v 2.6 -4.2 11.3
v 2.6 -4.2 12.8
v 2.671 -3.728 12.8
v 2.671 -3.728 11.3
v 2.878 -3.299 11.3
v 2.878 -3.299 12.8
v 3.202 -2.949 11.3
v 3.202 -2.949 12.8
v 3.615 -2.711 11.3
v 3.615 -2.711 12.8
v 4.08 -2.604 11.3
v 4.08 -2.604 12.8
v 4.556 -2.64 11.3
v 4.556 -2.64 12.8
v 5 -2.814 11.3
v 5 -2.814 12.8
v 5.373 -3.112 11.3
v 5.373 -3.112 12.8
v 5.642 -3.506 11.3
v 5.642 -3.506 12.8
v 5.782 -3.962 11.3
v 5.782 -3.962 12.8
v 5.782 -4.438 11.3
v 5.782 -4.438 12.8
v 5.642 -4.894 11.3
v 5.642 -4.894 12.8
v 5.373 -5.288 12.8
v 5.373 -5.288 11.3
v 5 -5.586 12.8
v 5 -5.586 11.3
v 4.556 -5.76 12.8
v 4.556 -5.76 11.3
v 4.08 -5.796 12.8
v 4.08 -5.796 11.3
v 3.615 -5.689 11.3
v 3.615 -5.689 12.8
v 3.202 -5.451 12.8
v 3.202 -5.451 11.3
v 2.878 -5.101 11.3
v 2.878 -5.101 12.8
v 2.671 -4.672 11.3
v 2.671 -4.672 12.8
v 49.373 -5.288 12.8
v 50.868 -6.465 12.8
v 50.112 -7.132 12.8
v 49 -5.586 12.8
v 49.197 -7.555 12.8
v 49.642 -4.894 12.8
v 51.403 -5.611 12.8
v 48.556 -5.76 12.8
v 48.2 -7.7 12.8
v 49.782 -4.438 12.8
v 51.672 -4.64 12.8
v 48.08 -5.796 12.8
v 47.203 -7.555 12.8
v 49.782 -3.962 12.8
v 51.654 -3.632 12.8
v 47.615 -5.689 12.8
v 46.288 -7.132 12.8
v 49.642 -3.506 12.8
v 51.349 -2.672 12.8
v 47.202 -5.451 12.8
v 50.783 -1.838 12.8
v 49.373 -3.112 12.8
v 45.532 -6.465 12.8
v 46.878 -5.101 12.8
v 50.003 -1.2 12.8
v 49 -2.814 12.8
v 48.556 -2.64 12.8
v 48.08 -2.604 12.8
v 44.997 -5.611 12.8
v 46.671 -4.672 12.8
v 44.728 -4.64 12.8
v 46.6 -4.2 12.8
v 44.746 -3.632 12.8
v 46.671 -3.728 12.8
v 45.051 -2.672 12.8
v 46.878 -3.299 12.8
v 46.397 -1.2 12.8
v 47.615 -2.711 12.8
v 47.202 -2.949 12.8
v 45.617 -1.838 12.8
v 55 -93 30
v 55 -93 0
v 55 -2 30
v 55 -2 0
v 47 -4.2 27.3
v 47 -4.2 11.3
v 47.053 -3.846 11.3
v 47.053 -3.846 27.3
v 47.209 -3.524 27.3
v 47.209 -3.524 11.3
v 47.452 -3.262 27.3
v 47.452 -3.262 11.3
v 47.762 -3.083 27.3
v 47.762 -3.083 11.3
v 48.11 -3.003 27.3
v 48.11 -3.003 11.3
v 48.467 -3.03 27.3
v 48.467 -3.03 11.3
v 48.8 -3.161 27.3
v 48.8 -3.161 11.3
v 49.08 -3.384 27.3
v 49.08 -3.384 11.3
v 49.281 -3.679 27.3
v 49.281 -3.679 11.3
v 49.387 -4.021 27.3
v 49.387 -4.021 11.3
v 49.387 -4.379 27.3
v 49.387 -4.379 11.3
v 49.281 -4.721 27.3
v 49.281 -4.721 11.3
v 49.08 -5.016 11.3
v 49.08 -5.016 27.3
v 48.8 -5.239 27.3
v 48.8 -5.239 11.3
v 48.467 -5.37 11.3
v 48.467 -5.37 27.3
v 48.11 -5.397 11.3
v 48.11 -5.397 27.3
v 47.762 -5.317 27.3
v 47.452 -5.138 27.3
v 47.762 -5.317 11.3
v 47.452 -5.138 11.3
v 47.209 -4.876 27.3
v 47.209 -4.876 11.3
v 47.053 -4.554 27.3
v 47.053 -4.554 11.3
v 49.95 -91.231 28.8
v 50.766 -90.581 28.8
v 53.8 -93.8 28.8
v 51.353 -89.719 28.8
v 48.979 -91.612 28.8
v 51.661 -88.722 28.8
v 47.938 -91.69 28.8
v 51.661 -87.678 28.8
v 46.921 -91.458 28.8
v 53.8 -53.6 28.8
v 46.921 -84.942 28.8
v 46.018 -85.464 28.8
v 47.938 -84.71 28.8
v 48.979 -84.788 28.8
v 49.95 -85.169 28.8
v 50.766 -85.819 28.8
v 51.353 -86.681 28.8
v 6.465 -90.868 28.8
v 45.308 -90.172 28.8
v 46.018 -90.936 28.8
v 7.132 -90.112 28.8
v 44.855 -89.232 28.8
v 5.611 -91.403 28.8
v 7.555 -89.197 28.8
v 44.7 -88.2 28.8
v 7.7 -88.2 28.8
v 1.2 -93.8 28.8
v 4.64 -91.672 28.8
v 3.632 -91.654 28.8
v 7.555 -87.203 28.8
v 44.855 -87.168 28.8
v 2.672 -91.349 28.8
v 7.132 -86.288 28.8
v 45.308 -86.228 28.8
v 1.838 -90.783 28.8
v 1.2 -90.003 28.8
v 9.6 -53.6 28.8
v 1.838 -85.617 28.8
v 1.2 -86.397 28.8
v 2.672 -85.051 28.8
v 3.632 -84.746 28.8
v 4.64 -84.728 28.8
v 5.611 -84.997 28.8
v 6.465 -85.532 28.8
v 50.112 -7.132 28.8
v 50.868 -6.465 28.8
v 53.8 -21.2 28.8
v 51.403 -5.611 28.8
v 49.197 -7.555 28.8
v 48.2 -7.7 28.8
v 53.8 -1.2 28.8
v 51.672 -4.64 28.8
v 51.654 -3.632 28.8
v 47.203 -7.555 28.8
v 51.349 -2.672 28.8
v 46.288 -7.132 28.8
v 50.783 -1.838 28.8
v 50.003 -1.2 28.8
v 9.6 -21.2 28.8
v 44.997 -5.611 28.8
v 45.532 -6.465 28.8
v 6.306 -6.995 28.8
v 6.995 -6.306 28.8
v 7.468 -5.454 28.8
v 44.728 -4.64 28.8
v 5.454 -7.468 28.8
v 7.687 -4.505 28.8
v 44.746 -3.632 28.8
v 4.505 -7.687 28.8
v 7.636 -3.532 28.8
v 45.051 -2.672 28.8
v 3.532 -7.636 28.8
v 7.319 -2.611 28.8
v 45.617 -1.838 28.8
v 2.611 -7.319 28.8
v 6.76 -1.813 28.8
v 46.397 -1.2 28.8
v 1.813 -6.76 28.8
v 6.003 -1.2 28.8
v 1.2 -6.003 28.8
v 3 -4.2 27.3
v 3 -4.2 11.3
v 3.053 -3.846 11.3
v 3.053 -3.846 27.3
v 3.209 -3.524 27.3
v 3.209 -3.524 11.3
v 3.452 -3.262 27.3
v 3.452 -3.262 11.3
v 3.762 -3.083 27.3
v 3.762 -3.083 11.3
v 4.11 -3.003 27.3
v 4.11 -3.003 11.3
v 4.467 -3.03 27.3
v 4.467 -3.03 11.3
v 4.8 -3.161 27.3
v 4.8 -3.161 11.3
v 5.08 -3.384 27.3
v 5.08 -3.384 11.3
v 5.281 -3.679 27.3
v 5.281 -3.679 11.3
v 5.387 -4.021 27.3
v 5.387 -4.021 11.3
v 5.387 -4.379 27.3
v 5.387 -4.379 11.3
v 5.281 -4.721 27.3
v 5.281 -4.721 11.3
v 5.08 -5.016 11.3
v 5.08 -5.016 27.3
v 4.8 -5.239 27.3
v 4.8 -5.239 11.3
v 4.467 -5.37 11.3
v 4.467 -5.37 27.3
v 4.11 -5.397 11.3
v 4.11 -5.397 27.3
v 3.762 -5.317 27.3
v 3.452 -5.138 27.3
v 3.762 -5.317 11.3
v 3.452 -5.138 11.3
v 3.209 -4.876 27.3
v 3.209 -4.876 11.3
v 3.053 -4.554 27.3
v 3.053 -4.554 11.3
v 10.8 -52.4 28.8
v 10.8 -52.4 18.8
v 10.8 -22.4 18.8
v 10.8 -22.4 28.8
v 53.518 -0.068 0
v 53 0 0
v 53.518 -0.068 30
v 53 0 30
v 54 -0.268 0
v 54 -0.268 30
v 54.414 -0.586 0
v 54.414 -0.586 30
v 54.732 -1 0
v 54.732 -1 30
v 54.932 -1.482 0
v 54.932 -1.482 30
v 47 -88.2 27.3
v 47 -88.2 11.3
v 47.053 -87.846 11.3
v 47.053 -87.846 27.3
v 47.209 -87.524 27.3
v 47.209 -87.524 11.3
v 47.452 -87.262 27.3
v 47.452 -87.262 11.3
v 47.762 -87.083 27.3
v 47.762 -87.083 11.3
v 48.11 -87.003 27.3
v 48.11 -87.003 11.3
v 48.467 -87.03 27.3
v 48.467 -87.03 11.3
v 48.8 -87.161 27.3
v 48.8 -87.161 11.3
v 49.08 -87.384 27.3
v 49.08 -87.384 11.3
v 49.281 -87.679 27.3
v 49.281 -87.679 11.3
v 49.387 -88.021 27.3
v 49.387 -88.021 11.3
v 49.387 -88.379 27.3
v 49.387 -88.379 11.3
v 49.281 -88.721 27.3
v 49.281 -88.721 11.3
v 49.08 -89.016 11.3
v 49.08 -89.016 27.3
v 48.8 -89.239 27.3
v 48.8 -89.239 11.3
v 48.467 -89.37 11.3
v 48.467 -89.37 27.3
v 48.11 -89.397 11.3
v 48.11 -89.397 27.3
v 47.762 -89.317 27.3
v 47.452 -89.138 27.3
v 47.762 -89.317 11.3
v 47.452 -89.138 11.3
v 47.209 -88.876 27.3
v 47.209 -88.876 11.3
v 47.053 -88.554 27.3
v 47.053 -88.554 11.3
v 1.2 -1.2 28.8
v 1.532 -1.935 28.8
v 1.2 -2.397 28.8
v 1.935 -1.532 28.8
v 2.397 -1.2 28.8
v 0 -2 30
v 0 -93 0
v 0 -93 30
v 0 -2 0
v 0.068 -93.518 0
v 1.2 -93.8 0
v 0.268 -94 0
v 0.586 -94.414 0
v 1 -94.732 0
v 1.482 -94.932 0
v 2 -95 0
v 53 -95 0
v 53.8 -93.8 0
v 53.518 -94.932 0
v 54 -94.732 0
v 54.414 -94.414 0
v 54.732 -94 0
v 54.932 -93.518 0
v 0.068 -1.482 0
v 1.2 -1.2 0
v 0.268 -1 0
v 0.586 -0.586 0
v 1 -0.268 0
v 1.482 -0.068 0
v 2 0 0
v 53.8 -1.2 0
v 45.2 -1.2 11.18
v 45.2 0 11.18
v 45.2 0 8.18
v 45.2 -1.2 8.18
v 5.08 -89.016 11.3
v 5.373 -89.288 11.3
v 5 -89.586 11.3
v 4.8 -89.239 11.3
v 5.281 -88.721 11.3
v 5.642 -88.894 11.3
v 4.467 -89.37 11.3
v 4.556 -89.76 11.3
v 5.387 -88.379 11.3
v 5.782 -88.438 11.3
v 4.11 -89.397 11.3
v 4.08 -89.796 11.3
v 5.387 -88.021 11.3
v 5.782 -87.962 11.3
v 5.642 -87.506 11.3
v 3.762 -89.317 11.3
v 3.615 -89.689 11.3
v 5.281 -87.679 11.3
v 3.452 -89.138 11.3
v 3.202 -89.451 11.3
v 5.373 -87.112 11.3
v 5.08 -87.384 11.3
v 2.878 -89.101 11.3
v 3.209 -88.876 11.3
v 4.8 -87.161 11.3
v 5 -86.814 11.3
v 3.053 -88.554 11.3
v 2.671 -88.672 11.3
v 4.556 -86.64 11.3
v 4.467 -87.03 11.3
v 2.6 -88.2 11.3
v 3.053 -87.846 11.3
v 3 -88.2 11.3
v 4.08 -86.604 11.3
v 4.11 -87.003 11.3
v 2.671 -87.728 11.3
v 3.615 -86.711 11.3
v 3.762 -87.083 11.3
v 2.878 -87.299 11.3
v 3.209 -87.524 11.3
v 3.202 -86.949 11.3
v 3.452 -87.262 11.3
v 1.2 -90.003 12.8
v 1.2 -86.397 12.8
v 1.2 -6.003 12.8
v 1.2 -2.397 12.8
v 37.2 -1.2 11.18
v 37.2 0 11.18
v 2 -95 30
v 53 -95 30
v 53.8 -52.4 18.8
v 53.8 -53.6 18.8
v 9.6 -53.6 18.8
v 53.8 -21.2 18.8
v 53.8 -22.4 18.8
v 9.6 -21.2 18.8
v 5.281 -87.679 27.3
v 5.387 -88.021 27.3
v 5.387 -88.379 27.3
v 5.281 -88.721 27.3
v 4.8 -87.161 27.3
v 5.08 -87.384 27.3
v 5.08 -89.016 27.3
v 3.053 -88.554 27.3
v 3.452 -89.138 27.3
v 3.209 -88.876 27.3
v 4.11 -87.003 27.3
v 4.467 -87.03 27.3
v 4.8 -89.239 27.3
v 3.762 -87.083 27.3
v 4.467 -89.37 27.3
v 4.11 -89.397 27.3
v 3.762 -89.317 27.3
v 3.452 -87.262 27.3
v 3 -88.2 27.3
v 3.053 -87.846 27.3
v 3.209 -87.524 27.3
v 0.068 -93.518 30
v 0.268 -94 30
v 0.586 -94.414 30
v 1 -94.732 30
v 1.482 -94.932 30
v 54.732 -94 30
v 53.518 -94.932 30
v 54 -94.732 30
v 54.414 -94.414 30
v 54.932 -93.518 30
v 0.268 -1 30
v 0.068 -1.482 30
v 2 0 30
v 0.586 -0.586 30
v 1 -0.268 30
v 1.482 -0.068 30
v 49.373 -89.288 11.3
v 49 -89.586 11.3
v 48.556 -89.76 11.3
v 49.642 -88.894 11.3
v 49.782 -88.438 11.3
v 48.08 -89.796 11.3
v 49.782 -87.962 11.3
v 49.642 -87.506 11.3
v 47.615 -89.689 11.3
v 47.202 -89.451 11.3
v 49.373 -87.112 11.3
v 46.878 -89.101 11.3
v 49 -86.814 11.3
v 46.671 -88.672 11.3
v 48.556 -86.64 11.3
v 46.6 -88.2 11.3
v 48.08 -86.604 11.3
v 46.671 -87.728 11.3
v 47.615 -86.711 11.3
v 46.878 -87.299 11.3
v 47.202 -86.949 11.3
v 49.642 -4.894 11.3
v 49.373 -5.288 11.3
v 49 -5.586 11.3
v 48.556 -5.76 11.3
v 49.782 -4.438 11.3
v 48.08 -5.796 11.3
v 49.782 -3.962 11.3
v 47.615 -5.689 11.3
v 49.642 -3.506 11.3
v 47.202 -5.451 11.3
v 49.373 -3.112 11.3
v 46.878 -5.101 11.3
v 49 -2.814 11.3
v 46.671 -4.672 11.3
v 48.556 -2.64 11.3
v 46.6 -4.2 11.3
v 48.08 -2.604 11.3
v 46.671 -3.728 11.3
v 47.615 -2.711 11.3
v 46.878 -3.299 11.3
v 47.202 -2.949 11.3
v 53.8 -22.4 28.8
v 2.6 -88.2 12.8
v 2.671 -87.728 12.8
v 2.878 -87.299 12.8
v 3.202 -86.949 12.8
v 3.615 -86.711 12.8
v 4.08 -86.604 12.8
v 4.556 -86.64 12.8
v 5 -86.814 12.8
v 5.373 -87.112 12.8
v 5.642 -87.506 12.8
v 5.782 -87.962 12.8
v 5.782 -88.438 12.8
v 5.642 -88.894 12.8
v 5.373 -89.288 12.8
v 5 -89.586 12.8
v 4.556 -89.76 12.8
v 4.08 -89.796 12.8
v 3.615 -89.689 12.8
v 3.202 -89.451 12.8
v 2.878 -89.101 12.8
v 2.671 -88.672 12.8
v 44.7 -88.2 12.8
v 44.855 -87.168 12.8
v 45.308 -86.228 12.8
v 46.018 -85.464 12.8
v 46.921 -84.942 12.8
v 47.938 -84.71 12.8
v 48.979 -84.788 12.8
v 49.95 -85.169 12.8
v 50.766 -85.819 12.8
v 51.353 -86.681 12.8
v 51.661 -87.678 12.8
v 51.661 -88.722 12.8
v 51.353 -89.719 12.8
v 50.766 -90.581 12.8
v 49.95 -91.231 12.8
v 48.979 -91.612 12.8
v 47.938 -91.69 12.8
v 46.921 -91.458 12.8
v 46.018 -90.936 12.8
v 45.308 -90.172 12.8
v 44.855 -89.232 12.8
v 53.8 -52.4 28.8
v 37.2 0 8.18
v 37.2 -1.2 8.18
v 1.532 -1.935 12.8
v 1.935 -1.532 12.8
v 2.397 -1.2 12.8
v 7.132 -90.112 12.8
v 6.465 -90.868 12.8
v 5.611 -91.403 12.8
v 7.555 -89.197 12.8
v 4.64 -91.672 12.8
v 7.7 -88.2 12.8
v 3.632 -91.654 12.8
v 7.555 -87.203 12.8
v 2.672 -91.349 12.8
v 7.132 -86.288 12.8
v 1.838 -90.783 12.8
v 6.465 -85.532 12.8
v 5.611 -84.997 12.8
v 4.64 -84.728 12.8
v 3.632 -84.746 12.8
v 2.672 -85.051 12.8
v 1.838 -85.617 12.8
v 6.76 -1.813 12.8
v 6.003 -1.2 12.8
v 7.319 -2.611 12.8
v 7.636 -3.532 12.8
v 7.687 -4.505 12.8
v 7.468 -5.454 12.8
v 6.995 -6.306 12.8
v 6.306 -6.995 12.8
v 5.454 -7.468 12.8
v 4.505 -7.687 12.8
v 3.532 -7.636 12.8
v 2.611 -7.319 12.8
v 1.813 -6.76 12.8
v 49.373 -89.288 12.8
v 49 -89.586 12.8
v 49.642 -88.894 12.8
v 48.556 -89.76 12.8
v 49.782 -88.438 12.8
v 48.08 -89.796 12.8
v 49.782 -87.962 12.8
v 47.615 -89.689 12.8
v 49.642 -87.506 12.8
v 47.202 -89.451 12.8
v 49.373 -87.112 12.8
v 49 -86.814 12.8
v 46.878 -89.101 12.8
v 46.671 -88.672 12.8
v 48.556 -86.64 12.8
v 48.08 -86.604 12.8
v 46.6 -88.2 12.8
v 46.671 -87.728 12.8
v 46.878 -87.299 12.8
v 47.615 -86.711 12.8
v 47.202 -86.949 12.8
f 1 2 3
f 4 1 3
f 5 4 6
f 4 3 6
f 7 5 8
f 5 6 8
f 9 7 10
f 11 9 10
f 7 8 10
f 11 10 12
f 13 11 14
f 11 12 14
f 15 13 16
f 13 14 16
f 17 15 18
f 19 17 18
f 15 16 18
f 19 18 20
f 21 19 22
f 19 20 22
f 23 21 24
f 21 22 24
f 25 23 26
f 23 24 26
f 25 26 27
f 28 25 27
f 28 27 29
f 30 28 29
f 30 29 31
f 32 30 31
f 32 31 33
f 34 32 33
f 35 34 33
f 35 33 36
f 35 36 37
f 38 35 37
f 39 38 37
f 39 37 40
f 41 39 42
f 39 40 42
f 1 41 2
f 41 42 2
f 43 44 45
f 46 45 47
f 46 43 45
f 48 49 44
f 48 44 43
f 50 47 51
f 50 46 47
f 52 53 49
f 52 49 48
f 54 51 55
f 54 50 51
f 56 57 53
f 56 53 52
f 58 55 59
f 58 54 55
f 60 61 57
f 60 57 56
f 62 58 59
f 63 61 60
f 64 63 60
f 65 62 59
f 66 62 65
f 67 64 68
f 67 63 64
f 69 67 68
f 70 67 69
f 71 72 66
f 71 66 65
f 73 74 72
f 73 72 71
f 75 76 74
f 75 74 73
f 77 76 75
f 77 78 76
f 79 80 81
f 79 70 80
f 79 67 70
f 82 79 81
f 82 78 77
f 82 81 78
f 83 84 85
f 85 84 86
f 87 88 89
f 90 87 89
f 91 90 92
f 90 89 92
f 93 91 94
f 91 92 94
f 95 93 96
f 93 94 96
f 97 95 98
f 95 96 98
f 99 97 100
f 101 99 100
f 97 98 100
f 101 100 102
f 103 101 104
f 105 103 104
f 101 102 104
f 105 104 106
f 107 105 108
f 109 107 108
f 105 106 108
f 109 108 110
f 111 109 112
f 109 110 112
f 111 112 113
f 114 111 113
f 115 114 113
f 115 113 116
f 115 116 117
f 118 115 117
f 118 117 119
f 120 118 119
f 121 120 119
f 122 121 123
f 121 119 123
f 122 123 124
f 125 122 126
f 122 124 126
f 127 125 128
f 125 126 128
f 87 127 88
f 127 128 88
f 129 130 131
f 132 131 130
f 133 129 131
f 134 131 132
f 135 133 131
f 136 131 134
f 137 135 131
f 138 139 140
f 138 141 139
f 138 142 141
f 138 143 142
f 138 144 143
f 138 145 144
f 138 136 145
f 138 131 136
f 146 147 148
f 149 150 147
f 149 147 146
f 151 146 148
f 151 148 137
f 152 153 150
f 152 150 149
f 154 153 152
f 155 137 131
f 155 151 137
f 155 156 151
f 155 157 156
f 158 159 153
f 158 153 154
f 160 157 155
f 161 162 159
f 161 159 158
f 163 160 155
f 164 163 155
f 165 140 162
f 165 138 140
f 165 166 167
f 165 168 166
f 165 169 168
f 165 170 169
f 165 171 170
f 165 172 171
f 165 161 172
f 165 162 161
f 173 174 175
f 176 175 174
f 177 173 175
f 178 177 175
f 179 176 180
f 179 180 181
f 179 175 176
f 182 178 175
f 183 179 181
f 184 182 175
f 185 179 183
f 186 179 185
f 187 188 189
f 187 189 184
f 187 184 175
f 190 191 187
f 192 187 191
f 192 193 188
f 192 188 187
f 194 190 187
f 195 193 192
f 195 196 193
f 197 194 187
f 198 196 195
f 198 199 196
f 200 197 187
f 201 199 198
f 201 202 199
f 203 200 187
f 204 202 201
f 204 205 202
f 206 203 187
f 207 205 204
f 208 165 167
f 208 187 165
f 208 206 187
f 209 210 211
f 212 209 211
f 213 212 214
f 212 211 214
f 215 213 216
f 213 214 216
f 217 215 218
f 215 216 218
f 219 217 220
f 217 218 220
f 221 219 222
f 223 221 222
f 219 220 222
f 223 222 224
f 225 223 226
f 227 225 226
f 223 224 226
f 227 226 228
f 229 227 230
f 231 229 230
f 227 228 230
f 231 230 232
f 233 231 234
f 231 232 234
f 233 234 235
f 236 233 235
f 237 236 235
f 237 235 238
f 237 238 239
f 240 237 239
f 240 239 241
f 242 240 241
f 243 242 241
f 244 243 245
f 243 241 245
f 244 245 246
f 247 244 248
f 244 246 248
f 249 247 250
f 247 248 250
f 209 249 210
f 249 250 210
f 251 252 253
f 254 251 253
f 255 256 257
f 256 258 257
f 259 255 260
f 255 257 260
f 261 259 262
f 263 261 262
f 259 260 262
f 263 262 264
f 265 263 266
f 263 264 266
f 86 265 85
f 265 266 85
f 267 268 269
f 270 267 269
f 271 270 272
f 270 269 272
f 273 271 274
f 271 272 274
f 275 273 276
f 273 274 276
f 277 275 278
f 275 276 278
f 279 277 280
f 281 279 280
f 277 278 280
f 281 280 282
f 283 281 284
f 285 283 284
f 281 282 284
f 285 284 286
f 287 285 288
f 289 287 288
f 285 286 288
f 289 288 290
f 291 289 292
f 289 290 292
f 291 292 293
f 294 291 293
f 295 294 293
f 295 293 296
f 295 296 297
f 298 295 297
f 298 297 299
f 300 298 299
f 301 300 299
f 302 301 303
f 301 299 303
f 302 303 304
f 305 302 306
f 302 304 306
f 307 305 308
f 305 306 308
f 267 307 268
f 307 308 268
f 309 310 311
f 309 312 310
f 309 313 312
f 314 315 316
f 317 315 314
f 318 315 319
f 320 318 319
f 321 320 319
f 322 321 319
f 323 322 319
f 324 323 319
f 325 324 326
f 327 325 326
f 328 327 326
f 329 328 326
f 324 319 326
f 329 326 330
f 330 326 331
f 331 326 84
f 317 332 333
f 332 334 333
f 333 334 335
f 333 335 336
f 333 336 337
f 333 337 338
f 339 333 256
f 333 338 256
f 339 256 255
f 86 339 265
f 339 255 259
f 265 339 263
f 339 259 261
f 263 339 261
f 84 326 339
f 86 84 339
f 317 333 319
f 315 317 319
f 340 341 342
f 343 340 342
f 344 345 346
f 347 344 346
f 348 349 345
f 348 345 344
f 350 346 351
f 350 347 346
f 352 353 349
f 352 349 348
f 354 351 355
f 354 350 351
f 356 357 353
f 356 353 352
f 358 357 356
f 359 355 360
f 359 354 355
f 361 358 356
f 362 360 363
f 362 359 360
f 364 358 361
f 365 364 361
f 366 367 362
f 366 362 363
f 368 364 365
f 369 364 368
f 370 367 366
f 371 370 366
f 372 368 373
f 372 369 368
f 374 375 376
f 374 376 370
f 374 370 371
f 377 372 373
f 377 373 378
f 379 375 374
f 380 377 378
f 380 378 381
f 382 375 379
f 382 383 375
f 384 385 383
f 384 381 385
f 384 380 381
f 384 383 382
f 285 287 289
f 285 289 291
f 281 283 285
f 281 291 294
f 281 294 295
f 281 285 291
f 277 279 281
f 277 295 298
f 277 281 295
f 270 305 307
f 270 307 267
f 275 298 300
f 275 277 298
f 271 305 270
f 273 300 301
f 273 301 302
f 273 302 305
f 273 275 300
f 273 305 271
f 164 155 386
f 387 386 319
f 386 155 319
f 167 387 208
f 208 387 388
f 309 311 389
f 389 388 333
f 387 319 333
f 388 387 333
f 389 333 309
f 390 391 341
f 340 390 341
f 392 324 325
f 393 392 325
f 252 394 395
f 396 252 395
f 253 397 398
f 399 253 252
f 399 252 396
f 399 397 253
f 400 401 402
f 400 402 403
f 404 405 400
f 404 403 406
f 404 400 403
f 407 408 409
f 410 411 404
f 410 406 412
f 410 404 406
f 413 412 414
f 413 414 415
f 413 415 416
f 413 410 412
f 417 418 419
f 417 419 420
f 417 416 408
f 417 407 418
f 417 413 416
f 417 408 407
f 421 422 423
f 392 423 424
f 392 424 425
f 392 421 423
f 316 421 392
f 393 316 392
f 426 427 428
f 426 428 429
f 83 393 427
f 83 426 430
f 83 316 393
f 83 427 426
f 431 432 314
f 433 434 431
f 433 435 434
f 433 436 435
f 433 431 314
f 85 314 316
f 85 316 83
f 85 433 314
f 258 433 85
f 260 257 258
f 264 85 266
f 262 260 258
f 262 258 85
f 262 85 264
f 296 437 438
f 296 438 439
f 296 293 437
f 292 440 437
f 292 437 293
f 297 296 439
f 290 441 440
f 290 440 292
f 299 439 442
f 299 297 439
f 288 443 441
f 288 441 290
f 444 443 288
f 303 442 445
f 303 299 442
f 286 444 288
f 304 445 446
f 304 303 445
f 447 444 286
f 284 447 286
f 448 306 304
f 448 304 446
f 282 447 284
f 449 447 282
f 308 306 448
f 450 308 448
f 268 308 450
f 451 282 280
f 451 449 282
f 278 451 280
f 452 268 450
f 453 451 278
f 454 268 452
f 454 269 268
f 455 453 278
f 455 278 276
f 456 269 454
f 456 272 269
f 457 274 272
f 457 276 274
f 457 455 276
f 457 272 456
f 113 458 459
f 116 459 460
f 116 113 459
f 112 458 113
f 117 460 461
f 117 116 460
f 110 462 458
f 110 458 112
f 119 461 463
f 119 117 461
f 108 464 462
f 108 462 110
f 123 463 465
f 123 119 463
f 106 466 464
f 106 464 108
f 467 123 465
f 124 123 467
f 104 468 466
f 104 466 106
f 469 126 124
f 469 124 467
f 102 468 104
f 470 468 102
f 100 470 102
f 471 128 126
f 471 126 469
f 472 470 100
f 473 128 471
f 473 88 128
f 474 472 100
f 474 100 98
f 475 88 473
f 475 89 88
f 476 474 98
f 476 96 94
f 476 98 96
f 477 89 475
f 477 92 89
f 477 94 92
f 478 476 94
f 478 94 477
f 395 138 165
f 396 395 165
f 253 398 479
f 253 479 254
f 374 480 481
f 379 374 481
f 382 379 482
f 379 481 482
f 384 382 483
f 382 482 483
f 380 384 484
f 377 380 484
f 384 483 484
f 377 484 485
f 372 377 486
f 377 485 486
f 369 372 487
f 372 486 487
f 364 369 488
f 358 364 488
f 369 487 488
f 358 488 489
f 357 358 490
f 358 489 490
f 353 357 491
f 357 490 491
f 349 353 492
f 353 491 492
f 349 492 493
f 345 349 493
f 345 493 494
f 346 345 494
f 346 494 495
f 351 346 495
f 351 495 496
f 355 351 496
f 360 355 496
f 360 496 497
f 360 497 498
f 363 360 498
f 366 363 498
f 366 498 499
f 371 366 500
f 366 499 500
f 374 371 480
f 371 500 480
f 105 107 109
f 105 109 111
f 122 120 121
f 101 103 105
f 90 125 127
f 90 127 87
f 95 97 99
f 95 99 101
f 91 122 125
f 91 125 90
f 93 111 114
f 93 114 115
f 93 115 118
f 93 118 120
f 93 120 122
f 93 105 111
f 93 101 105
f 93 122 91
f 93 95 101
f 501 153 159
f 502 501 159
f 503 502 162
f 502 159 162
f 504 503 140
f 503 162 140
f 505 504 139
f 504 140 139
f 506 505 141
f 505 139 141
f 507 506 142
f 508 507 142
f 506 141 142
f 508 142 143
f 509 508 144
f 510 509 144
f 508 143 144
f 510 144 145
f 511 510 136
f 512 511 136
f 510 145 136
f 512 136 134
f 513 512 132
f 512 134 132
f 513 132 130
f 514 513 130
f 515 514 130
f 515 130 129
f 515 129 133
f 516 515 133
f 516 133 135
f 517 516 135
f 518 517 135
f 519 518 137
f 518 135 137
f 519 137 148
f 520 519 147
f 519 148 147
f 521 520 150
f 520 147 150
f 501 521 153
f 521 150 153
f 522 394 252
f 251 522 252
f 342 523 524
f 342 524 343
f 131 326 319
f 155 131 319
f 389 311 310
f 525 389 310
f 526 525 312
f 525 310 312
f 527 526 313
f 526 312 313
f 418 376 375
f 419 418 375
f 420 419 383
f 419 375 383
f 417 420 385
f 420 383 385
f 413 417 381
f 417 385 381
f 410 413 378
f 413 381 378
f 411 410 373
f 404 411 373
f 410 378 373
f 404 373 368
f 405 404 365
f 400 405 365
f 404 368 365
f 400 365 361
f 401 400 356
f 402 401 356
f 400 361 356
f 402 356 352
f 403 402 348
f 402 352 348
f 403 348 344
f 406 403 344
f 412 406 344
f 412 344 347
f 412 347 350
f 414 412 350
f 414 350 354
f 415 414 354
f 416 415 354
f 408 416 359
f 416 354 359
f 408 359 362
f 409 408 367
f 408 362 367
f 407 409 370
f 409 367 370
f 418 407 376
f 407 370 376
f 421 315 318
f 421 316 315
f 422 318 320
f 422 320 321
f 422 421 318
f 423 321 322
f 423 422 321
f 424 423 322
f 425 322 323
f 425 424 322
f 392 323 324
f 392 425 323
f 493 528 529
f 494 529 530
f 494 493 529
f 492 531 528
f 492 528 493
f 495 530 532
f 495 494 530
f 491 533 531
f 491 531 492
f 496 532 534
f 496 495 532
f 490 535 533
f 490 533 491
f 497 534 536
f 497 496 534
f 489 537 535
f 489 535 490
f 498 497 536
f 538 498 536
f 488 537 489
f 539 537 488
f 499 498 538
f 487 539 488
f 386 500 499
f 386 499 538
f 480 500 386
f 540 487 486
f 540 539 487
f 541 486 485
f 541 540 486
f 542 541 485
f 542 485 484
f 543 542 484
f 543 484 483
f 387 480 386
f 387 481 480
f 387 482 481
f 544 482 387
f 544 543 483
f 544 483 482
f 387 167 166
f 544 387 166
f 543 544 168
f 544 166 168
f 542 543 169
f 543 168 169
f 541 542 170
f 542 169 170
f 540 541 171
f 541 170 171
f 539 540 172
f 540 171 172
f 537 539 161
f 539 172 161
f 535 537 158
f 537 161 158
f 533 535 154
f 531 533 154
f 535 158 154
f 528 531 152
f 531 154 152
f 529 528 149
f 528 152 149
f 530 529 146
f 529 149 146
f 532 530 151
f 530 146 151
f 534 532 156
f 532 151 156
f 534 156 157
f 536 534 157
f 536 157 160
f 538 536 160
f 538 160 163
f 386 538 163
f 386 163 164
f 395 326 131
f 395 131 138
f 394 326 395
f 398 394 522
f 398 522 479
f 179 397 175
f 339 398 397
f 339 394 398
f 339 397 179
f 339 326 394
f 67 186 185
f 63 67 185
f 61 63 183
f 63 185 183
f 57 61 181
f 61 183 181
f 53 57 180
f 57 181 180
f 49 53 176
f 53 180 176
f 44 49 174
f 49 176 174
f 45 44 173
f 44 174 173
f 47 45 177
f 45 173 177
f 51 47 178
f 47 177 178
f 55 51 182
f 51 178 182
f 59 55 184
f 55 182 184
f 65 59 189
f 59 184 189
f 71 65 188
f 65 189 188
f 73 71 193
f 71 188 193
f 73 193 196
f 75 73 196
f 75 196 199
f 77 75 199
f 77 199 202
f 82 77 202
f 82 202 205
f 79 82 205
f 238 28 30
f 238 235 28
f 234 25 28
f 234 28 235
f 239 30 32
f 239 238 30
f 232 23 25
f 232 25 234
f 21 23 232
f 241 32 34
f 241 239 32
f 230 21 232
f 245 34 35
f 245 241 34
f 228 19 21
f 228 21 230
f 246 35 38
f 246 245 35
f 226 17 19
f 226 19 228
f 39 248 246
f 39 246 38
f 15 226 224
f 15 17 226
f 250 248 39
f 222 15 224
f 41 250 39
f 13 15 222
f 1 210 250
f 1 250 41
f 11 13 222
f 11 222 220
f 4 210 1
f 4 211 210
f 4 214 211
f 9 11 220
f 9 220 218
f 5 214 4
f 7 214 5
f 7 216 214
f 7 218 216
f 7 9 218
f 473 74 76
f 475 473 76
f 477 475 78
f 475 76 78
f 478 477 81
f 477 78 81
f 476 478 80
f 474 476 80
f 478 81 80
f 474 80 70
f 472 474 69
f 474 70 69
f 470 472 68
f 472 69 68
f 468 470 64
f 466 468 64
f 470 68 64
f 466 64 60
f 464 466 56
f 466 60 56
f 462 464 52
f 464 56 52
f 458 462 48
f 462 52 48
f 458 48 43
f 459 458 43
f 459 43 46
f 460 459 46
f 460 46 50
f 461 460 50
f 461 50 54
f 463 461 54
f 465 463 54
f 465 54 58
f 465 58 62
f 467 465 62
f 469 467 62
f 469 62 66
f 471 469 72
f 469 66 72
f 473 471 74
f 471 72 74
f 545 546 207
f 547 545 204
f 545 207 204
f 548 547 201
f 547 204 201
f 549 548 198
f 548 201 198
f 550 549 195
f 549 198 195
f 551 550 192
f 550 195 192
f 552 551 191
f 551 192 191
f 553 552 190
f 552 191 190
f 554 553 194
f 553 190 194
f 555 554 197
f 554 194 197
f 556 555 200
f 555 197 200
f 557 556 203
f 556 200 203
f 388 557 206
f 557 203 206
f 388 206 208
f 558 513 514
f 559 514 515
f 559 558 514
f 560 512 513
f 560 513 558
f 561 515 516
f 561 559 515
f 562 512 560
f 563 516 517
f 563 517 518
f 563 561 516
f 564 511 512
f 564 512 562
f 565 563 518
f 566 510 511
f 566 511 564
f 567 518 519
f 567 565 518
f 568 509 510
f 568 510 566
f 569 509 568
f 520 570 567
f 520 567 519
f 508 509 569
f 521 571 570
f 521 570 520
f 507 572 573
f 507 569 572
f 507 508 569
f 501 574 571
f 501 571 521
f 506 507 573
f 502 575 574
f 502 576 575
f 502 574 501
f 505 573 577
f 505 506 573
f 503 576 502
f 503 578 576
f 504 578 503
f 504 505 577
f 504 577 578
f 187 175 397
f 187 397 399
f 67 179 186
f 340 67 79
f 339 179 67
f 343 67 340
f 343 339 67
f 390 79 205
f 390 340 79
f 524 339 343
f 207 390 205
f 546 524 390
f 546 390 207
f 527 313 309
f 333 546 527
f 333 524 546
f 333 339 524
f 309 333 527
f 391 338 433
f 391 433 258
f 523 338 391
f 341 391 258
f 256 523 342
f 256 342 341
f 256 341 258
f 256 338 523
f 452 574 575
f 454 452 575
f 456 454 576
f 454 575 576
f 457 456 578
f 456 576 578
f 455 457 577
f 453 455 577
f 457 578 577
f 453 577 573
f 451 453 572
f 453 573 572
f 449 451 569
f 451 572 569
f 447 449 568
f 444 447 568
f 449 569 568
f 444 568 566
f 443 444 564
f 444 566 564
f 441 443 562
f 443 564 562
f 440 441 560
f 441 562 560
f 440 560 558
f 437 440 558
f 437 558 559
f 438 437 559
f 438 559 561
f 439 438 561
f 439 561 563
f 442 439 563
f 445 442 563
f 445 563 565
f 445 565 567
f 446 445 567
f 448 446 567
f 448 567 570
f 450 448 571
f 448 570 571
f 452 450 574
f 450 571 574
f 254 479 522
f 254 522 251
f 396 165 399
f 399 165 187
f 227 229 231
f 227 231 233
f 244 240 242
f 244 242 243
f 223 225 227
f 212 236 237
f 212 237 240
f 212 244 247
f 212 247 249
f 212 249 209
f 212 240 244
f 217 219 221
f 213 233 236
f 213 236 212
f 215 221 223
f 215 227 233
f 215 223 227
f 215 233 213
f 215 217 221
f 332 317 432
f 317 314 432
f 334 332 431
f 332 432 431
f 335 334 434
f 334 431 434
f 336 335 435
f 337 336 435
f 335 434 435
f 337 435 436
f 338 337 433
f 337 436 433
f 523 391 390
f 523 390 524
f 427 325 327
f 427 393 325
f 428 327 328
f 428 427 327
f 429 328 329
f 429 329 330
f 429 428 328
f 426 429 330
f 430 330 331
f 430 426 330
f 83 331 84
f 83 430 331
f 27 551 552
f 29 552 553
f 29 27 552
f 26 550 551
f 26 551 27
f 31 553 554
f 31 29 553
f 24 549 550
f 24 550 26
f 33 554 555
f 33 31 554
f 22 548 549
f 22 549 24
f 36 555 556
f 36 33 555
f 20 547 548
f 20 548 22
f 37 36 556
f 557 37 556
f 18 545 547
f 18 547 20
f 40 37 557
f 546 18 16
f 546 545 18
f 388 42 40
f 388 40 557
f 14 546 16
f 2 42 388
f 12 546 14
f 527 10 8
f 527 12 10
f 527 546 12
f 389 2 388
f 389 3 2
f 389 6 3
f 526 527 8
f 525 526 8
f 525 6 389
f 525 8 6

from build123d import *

# Parameters (mm, degrees)
SKETCH1_W           = 55
SKETCH1_H           = 95
BOSS_EXTRUDE1_DEPTH = 30
SKETCH2_W           = 52.6
SKETCH2_H           = 92.6
CUT_EXTRUDE1_DEPTH  = 28.8
SKETCH3_R           = 3.5
BOSS_EXTRUDE2_DEPTH = 16
SKETCH6_R           = 1.6
BOSS_EXTRUDE3_DEPTH = 1.5
FILLET3_R           = 2
SKETCH8_W           = 44.2
SKETCH8_H           = 32.4
BOSS_EXTRUDE4_DEPTH = 10
SKETCH9_W           = 43
SKETCH9_H           = 30
CUT_EXTRUDE3_DEPTH  = 10
CUT_EXTRUDE4_REACH  = 97
SKETCH11_W          = 8
SKETCH11_H          = 3
SKETCH7_R           = 1.2
CUT_EXTRUDE5_DEPTH  = 16


with BuildPart() as part:
    # Sketch1 → Boss-Extrude1 (new body)
    with BuildSketch(Plane.XY):
        with Locations((27.5, -47.5)):
            Rectangle(SKETCH1_W, SKETCH1_H)
    extrude(amount=BOSS_EXTRUDE1_DEPTH)

    # Sketch2 → Cut-Extrude1 (cut)
    with BuildSketch(Plane(origin=(0, 0, 0), x_dir=(-1, 0, 0), z_dir=(0, 0, -1))):
        with Locations((-27.5, -47.5)):
            Rectangle(SKETCH2_W, SKETCH2_H)
    extrude(amount=-CUT_EXTRUDE1_DEPTH, mode=Mode.SUBTRACT)

    # Sketch3 → Boss-Extrude2 (add)
    with BuildSketch(Plane(origin=(0, 0, 28.8), x_dir=(-1, 0, 0), z_dir=(0, 0, -1))):
        with Locations((-4.2, -4.2)):
            Circle(SKETCH3_R)
        with Locations((-48.2, -4.2)):
            Circle(SKETCH3_R)
        with Locations((-48.2, -88.2)):
            Circle(SKETCH3_R)
        with Locations((-4.2, -88.2)):
            Circle(SKETCH3_R)
    extrude(amount=BOSS_EXTRUDE2_DEPTH)

    # Sketch6 → Boss-Extrude3 (add)
    with BuildSketch(Plane(origin=(0, 0, 12.8), x_dir=(-1, 0, 0), z_dir=(0, 0, -1))):
        with Locations((-4.2, -4.2)):
            Circle(SKETCH6_R)
        with Locations((-48.2, -4.2)):
            Circle(SKETCH6_R)
        with Locations((-48.2, -88.2)):
            Circle(SKETCH6_R)
        with Locations((-4.2, -88.2)):
            Circle(SKETCH6_R)
    extrude(amount=BOSS_EXTRUDE3_DEPTH)

    # Fillet3
    fillet3_edges = [part.edges().sort_by_distance(p)[0] for p in [
        (0, 0, 15),
        (55, 0, 15),
        (55, -95, 15),
        (0, -95, 15),
    ]]
    fillet(fillet3_edges, radius=FILLET3_R)

    # Sketch8 → Boss-Extrude4 (add)
    with BuildSketch(Plane(origin=(0, 0, 28.8), x_dir=(-1, 0, 0), z_dir=(0, 0, -1))):
        with Locations((-31.7, -37.4)):
            Rectangle(SKETCH8_W, SKETCH8_H)
    extrude(amount=BOSS_EXTRUDE4_DEPTH)

    # Sketch9 → Cut-Extrude3 (cut)
    with BuildSketch(Plane(origin=(0, 0, 18.8), x_dir=(-1, 0, 0), z_dir=(0, 0, -1))):
        with Locations((-32.3, -37.4)):
            Rectangle(SKETCH9_W, SKETCH9_H)
    extrude(amount=-CUT_EXTRUDE3_DEPTH, mode=Mode.SUBTRACT)

    # Sketch11 → Cut-Extrude4 (cut, up to next)
    with BuildSketch(Plane(origin=(0, 0, 0), x_dir=(1, 0, 0), z_dir=(0, 1, 0)), mode=Mode.PRIVATE) as cut_extrude4_sk1:
        with Locations((41.2, -9.68)):
            Rectangle(SKETCH11_W, SKETCH11_H)
    cut_extrude4_tool1 = extrude(cut_extrude4_sk1.sketch, amount=-CUT_EXTRUDE4_REACH, mode=Mode.PRIVATE) & part.part
    add(cut_extrude4_tool1.solids().sort_by_distance((41.2, 0, 9.68))[0], mode=Mode.SUBTRACT)

    # Sketch7 → Cut-Extrude5 (cut)
    with BuildSketch(Plane(origin=(0, 0, 11.3), x_dir=(-1, 0, 0), z_dir=(0, 0, -1))):
        with Locations((-4.2, -4.2)):
            Circle(SKETCH7_R)
        with Locations((-48.2, -4.2)):
            Circle(SKETCH7_R)
        with Locations((-48.2, -88.2)):
            Circle(SKETCH7_R)
        with Locations((-4.2, -88.2)):
            Circle(SKETCH7_R)
    extrude(amount=-CUT_EXTRUDE5_DEPTH, mode=Mode.SUBTRACT)


solid = part.part
